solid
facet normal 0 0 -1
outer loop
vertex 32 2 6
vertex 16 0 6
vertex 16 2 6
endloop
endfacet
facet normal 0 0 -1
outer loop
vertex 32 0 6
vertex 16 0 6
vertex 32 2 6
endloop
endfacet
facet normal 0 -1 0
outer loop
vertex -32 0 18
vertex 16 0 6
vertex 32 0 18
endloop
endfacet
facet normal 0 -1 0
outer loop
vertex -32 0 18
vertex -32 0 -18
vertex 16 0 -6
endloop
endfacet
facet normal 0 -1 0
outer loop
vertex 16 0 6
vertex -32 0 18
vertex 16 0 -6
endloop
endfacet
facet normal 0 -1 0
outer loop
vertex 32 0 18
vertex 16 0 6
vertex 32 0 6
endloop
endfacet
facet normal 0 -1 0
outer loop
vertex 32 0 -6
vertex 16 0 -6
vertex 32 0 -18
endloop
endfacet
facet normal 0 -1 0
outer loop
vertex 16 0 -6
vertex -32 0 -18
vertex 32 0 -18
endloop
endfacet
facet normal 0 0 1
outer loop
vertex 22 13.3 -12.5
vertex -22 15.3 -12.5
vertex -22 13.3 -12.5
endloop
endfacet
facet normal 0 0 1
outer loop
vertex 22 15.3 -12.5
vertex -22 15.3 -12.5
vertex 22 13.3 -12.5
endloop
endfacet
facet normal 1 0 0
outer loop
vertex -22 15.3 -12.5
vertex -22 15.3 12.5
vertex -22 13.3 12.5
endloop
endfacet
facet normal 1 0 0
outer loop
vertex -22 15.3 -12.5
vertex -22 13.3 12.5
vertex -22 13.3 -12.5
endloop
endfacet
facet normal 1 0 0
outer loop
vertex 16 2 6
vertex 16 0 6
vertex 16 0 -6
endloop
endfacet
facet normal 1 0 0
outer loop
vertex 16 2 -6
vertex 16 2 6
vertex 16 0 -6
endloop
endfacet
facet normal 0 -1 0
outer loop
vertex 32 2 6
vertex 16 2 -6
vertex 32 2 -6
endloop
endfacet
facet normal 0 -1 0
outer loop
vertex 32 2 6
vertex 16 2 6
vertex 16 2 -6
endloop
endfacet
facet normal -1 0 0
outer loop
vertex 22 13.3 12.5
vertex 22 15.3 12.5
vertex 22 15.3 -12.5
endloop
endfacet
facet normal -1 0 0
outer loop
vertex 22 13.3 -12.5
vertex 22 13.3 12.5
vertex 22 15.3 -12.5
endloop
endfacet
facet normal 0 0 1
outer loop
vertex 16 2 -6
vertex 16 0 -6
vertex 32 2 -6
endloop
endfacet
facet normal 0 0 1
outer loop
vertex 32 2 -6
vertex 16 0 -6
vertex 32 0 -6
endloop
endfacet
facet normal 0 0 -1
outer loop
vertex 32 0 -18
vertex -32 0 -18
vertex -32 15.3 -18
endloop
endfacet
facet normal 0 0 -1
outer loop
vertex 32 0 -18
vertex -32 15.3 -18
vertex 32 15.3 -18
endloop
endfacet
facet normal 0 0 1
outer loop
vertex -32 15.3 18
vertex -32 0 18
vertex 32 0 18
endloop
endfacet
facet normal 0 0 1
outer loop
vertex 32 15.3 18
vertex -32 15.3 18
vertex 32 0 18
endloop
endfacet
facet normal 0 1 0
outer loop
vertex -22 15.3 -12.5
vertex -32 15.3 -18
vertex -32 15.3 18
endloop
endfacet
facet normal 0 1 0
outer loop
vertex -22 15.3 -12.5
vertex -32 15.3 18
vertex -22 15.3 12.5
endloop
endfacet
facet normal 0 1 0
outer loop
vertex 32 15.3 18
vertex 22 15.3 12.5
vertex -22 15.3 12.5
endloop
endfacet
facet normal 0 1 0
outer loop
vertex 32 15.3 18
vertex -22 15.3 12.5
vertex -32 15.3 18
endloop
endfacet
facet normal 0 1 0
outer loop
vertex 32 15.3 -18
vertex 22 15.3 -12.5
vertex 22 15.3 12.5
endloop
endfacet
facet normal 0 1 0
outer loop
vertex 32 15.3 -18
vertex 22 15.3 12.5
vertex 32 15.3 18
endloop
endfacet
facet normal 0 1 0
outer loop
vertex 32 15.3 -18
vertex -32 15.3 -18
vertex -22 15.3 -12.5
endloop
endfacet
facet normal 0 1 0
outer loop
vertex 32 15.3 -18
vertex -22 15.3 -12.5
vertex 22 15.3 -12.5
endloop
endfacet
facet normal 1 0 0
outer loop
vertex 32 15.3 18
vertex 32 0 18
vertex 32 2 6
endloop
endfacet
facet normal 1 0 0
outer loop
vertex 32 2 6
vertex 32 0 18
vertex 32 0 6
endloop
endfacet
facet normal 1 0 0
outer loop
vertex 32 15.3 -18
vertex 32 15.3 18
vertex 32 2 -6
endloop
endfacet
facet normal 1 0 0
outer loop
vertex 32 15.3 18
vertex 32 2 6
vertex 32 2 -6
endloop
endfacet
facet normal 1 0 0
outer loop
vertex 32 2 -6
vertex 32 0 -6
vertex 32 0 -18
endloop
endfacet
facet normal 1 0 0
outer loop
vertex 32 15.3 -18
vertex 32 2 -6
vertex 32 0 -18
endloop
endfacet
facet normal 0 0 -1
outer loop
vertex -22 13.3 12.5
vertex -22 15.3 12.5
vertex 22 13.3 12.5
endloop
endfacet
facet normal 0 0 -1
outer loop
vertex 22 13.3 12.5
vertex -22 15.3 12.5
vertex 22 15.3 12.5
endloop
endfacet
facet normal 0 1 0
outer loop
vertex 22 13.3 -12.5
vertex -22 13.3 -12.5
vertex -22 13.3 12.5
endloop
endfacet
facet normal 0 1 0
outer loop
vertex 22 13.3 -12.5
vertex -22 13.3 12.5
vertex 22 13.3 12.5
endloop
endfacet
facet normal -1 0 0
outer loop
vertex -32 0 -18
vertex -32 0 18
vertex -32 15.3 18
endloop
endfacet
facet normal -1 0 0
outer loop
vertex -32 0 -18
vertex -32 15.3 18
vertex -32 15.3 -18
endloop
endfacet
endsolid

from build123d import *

# Parameters (mm, degrees)
SKETCH_1_W          = 64
SKETCH_1_H          = 36
EXTRUDE_1_DEPTH     = 15.3
SKETCH_2_W          = 44
SKETCH_2_H          = 25
CUT_EXTRUDE_1_DEPTH = 2
SKETCH_3_W          = 16
SKETCH_3_H          = 6
CUT_EXTRUDE_2_DEPTH = 2


with BuildPart() as part:
    # 草图1 → 凸台-拉伸1 (new body)
    with BuildSketch(Plane(origin=(0, 0, 0), x_dir=(1, 0, 0), z_dir=(0, 1, 0))):
        Rectangle(SKETCH_1_W, SKETCH_1_H)
    extrude(amount=EXTRUDE_1_DEPTH)

    # 草图2 → 切除-拉伸1 (cut)
    with BuildSketch(Plane(origin=(0, 15.3, 0), x_dir=(1, 0, 0), z_dir=(0, 1, 0))):
        Rectangle(SKETCH_2_W, SKETCH_2_H)
    extrude(amount=-CUT_EXTRUDE_1_DEPTH, mode=Mode.SUBTRACT)

    # 草图3 → 切除-拉伸2 (cut)
    with BuildSketch(Plane.XZ):
        with Locations((24, -3)):
            Rectangle(SKETCH_3_W, SKETCH_3_H)
        with Locations((24, 3)):
            Rectangle(SKETCH_3_W, SKETCH_3_H)
    extrude(amount=-CUT_EXTRUDE_2_DEPTH, mode=Mode.SUBTRACT)


solid = part.part
